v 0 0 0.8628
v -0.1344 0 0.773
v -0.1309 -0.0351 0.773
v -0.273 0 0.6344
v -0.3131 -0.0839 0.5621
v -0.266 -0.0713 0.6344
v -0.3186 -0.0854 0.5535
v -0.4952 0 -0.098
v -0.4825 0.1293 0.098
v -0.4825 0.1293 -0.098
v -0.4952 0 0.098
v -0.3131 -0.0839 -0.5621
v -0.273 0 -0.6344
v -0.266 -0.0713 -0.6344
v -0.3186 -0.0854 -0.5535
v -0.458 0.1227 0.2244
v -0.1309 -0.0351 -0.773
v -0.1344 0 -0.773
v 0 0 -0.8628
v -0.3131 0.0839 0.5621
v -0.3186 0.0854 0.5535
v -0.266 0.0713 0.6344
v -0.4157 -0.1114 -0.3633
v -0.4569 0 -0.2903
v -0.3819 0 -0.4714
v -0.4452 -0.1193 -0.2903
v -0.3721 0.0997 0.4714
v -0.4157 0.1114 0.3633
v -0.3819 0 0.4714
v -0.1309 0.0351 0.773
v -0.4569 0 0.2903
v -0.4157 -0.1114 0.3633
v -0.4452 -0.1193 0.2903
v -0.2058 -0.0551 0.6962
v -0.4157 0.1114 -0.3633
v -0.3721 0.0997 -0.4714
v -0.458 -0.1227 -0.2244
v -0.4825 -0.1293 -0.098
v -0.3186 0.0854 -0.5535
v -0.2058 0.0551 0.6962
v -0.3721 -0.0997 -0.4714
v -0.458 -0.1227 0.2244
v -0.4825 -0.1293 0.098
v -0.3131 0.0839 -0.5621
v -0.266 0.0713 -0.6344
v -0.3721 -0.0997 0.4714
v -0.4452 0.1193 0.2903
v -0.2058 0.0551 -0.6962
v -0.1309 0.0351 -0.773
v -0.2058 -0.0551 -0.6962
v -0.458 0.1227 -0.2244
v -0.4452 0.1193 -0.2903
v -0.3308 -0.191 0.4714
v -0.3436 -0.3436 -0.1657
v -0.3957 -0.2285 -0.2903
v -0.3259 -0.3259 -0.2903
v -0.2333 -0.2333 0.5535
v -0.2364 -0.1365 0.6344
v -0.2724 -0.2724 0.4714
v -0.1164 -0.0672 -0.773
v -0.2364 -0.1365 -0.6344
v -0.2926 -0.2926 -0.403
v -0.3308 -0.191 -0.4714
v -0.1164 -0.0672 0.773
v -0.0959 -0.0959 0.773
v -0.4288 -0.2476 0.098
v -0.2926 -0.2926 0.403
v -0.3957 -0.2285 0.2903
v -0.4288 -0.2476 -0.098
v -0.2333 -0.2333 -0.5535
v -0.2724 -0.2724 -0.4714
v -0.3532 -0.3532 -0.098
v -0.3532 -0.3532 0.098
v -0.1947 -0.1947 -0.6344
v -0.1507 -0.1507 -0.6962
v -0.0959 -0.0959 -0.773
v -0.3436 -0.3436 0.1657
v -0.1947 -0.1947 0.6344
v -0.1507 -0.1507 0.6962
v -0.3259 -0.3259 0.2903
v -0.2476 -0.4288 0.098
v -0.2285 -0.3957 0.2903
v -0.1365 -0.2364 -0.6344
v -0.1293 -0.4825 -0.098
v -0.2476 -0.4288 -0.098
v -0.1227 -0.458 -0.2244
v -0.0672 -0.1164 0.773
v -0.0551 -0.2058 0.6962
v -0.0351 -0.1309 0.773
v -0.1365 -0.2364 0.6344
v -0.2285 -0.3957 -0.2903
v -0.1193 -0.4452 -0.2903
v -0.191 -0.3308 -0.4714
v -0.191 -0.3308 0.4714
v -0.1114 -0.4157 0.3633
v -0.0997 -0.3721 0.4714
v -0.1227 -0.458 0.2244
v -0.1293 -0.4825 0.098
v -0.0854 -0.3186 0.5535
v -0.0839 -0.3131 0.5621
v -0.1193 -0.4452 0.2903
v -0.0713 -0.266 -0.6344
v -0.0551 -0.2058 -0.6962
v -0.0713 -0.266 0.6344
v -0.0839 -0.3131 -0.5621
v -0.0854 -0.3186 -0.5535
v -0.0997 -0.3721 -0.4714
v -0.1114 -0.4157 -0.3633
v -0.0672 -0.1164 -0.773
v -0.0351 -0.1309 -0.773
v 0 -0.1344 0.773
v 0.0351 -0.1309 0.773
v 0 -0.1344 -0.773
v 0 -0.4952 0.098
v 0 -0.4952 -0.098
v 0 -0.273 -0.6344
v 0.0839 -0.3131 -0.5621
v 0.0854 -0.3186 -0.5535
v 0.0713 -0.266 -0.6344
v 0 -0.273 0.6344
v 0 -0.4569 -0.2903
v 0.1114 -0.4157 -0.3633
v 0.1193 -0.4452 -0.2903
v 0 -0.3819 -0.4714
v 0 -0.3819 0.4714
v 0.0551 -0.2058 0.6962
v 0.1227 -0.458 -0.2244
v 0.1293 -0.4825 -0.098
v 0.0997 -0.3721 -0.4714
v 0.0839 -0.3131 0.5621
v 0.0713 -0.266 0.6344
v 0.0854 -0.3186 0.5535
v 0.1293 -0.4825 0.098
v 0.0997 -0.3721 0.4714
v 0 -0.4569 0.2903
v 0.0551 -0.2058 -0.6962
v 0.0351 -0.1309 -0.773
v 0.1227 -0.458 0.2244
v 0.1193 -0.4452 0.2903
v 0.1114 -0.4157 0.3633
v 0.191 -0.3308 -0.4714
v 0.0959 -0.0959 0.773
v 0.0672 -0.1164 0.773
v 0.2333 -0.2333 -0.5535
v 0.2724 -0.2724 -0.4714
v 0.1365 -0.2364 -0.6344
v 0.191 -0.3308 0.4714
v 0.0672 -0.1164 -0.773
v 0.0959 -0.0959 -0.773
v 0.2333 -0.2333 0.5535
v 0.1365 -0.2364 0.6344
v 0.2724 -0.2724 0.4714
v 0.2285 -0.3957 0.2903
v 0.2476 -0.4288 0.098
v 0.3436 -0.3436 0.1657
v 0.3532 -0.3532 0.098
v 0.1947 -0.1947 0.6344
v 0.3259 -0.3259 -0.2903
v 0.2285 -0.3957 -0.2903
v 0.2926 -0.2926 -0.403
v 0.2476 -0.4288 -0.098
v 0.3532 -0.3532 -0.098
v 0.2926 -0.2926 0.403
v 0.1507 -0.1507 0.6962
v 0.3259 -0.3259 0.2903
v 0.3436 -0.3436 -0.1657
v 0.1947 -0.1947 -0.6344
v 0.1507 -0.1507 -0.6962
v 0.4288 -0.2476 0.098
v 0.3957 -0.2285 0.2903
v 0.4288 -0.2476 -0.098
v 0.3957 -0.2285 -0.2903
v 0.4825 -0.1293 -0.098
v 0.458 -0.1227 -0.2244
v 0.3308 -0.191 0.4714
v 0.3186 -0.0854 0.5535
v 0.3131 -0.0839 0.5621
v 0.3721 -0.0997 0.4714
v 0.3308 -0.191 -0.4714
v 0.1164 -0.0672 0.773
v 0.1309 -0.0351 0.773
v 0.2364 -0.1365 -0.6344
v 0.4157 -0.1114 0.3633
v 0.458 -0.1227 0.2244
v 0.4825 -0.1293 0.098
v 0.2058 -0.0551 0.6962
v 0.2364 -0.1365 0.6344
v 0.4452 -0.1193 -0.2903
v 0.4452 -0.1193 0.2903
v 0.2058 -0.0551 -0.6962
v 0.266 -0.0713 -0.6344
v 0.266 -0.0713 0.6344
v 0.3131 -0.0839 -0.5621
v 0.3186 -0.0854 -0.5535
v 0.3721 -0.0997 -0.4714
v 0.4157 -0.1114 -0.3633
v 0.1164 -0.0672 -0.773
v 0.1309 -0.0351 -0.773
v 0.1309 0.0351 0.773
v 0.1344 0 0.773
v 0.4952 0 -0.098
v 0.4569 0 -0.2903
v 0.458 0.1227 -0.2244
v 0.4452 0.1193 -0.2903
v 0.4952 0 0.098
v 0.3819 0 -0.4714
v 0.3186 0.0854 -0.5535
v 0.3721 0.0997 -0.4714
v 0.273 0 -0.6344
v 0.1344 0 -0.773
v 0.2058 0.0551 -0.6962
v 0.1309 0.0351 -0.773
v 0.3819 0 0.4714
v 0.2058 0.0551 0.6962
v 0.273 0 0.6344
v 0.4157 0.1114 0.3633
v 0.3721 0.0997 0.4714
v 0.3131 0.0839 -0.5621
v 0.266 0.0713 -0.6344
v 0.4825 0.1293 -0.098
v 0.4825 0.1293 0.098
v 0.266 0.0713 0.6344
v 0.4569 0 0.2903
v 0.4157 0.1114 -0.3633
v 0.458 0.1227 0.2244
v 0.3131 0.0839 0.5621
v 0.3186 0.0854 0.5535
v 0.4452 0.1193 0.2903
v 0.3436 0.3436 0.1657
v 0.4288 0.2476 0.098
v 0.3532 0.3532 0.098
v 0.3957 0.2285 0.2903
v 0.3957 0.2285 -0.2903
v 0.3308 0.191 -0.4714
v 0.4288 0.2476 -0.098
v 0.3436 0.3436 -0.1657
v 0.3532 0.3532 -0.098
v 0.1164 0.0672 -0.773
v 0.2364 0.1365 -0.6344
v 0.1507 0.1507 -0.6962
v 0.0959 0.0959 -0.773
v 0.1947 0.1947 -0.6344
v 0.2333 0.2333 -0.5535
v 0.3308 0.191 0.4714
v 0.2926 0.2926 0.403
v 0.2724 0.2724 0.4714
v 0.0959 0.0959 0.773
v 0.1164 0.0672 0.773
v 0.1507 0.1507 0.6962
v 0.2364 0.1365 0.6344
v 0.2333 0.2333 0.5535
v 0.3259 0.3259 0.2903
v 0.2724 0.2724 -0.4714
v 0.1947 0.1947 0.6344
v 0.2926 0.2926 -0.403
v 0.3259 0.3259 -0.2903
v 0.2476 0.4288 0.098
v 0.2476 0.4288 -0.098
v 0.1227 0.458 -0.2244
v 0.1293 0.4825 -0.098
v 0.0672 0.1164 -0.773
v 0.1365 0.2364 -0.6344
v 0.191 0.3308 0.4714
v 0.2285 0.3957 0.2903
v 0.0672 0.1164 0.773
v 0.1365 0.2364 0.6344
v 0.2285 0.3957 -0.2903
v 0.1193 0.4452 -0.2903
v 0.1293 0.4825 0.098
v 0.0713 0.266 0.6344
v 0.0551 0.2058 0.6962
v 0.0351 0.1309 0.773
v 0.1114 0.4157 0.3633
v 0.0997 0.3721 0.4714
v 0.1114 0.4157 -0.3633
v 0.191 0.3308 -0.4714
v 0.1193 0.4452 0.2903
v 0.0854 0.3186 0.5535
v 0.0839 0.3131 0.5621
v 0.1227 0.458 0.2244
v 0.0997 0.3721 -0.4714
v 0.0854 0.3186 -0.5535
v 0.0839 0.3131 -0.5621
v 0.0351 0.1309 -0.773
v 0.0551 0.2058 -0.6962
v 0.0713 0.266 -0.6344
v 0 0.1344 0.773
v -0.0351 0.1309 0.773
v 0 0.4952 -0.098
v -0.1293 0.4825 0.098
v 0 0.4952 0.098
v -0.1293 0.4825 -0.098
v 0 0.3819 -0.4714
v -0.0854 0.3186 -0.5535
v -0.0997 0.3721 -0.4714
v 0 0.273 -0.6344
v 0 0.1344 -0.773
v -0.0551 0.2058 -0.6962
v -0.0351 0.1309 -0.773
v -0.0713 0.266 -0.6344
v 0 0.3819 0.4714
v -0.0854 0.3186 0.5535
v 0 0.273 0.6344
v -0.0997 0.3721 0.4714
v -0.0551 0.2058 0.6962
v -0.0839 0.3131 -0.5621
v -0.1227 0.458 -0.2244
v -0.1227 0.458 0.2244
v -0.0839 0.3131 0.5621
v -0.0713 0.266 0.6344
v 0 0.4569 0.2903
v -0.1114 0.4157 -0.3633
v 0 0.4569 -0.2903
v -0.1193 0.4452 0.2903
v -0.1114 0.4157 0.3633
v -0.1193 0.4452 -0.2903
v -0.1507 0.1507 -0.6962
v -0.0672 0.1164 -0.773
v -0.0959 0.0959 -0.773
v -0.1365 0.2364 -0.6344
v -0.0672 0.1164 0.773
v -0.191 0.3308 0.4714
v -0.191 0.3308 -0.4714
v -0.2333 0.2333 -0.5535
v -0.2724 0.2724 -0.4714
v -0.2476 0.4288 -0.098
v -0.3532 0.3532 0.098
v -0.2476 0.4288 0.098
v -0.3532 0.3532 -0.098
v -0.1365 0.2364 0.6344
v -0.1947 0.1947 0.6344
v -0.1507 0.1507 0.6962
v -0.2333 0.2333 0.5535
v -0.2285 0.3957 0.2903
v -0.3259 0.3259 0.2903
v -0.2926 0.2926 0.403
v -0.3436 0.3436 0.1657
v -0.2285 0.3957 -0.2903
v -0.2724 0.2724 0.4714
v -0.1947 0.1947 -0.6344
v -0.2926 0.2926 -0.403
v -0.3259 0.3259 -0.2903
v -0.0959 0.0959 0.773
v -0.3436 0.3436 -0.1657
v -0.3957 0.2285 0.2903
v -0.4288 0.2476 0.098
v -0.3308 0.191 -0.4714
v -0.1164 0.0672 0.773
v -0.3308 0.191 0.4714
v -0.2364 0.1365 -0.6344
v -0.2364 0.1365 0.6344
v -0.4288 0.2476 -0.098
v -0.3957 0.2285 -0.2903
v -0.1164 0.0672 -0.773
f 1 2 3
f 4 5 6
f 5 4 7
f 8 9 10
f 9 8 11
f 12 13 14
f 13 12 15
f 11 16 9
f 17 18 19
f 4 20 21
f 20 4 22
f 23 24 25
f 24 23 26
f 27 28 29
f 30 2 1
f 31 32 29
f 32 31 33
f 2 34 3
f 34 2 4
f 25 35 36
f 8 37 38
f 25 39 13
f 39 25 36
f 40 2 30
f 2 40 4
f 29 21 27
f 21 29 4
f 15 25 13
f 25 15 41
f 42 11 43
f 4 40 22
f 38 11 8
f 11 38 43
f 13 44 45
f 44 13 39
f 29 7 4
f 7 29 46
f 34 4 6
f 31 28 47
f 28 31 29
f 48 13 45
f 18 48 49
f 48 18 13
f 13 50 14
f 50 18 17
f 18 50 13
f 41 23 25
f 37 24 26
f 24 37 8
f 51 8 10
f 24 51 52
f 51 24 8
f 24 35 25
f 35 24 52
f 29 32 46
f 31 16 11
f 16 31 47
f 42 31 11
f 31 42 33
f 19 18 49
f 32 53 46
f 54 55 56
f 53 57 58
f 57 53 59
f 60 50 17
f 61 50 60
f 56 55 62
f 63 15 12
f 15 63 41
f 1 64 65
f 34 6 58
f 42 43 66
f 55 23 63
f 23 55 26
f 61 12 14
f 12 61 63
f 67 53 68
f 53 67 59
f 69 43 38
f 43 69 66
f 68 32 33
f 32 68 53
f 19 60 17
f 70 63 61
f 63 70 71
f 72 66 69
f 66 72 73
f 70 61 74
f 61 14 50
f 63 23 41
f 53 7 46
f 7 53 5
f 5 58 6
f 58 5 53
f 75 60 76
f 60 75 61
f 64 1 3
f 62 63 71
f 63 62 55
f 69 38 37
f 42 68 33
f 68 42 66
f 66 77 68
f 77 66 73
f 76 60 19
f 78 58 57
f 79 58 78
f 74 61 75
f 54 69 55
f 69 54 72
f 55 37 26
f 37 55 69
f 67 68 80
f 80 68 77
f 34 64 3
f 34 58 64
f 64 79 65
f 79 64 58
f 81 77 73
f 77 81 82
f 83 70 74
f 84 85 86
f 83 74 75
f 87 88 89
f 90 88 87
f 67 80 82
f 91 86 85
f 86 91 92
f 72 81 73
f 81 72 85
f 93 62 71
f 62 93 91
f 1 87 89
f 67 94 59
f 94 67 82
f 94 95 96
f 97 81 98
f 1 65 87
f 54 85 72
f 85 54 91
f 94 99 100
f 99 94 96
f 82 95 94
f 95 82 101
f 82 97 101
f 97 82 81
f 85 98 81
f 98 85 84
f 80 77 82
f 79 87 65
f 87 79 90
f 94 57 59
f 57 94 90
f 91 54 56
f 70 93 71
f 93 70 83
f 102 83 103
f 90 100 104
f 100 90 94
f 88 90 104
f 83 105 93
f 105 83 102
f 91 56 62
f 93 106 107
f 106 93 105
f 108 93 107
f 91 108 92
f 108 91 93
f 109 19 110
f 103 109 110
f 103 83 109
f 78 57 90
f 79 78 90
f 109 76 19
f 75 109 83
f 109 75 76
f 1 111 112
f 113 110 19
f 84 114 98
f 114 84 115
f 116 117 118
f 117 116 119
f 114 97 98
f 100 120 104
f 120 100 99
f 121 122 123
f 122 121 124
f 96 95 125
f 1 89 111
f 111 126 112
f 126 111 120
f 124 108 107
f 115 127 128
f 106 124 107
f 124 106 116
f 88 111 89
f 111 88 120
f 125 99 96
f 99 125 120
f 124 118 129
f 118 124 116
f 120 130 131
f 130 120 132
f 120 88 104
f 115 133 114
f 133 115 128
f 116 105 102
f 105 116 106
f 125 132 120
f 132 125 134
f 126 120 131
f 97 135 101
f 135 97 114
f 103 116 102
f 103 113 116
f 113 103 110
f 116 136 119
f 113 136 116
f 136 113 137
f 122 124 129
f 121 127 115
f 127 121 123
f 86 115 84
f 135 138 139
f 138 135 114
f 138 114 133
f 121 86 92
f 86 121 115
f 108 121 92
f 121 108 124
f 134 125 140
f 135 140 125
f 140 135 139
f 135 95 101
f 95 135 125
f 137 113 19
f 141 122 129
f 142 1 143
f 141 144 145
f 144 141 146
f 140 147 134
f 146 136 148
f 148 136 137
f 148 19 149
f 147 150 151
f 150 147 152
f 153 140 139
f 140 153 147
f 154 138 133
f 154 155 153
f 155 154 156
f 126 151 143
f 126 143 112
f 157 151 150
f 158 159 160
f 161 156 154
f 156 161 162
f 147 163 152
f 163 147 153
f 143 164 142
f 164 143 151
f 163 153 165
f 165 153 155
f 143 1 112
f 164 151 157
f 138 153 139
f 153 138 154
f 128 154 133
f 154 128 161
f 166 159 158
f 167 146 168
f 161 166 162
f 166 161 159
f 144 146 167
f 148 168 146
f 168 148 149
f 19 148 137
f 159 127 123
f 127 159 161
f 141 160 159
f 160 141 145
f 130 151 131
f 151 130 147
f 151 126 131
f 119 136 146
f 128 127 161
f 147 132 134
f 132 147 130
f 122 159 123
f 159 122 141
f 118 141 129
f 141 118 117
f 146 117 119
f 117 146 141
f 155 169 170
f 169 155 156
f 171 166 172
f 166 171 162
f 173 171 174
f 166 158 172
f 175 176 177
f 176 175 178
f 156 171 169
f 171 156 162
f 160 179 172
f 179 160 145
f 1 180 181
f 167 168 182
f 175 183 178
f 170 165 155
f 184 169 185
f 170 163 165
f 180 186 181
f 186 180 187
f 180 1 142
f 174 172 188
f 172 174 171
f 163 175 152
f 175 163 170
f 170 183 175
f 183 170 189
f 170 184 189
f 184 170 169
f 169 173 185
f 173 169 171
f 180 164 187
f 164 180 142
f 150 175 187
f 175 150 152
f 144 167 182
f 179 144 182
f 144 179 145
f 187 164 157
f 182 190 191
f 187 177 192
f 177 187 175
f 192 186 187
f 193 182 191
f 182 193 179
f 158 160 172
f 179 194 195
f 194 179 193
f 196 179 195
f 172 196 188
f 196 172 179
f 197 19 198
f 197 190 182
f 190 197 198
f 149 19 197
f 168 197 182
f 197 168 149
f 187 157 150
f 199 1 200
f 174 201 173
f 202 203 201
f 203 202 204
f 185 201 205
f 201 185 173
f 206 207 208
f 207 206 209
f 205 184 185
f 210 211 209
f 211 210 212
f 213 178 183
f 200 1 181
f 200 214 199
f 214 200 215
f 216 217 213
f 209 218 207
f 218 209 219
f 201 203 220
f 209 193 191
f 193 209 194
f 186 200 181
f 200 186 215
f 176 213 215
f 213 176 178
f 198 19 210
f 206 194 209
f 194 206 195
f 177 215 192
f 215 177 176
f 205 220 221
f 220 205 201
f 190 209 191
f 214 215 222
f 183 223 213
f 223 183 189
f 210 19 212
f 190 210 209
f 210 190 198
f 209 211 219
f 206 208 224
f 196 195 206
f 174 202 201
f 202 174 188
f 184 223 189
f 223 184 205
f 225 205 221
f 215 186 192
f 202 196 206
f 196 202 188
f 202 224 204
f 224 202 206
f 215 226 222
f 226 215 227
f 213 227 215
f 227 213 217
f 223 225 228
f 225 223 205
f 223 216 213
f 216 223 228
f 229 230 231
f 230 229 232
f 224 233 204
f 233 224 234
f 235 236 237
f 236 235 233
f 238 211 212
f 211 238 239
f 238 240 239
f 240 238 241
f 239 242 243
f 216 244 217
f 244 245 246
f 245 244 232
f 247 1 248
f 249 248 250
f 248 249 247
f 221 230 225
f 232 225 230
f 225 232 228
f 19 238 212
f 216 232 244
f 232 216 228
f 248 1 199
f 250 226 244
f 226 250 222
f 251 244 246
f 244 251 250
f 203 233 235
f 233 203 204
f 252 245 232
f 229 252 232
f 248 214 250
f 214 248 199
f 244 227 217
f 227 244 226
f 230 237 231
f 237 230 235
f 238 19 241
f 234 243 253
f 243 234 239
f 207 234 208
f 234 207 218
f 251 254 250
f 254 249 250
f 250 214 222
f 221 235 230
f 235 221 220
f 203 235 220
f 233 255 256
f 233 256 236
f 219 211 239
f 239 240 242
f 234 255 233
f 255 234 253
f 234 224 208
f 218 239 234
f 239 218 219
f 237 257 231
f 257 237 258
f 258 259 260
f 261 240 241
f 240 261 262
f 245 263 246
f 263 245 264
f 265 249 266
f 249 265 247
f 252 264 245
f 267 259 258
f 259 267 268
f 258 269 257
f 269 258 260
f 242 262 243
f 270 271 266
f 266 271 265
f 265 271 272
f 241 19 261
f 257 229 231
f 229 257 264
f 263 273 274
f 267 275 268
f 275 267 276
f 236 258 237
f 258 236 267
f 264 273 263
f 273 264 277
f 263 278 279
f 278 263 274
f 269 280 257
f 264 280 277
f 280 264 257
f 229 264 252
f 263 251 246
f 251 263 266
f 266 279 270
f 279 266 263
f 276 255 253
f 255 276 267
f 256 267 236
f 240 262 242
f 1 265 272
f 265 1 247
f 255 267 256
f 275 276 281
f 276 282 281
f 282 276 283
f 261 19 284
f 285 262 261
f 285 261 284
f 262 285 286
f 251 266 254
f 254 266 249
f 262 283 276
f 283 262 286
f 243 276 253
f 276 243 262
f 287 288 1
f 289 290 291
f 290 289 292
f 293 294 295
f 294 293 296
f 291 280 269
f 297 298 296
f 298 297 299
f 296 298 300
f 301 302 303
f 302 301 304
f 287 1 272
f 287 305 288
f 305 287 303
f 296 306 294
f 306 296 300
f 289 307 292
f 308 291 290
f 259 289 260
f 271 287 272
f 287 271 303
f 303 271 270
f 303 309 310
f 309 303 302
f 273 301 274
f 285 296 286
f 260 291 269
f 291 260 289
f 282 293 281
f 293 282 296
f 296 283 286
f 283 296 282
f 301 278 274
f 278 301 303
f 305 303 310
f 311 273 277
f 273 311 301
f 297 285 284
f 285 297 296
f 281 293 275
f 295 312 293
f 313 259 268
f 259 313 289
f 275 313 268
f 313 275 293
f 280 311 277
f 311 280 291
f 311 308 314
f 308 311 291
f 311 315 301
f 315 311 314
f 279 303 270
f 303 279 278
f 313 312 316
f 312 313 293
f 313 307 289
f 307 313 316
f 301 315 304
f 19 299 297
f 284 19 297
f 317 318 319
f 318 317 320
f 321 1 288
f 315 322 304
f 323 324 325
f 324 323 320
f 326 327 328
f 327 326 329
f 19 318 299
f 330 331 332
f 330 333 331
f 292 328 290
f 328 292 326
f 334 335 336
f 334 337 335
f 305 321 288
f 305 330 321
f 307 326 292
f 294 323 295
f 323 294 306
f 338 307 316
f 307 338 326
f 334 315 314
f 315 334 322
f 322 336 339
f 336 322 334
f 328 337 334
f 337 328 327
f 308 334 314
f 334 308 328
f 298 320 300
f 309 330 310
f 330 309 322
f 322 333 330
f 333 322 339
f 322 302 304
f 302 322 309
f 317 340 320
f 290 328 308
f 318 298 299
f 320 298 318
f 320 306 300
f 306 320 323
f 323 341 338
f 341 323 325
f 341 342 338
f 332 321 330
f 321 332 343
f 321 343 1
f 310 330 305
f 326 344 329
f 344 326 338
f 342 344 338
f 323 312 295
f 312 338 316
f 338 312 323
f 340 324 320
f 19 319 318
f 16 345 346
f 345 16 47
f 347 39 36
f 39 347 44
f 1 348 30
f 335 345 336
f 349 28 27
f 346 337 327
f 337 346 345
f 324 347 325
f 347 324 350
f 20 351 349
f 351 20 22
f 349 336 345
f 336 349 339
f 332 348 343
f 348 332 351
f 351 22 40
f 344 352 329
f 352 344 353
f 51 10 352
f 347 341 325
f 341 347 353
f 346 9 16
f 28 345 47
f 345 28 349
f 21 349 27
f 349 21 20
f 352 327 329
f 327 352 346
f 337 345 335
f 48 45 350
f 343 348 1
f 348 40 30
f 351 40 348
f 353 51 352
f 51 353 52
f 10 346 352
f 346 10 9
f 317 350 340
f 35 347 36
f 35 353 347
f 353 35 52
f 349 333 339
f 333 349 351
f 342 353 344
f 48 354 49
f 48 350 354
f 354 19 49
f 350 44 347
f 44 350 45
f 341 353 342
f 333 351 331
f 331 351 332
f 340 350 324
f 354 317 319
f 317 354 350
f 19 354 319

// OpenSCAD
//------------------------------------------------------------------------------------------
// THIS CODE WAS GENERATED WITH GRAPHSCAD
//------------------------------------------------------------------------------------------
// Graphscad is a graphical nodal editor to create .SCAD files
//
// More info : http://graphscad.free.fr
//
// Scad Files created with Graphscad can be edited by graphscad
// Scad Files created with Graphscad can be read by Openscad
//
//------------------------------------------------------------------------------------------
module intersectionfor()
{
 function node_sphere_matrix(i=0,j=0,k=0,l=0,m=0,n=0) = translate([0.5,0,0]);
 module node_sphere(i=0,j=0,k=0,l=0,m=0,n=0)
 {
  translate([0.5,0,0]) sphere(r=1.0,$fn=32);
 }
 function node_rotate_matrix(i=0,j=0,k=0,l=0,m=0,n=0) = rotate([0,0,i])*node_sphere_matrix(i=i,j=j,k=k,l=l,m=m,n=n);
 module node_rotate(i=0,j=0,k=0,l=0,m=0,n=0)
 {
  rotate([0,0,i])node_sphere(i,j,k,l,m,n);
 }
 function node_intersectionfor_matrix(i=0,j=0,k=0,l=0,m=0,n=0) = node_rotate_matrix(i=i,j=j,k=k,l=l,m=m,n=n);
 module node_intersectionfor(i=0,j=0,k=0,l=0,m=0,n=0)
 {
  intersection_for(i=[0:30:360])
  {
   node_rotate(i,j,k,l,m,n);
  }
 }
 node_intersectionfor();
 /*--------------------------------------------------------------------------------------------------------
  Graphscad Utils functions
  This code is Used By Graphscad Nodal Editor to generate SCAD files
 --------------------------------------------------------------------------------------------------------*/
 function det4x4(a) =
 a[0][0]*a[1][1]*a[2][2]*a[3][3] + a[0][0]*a[1][2]*a[2][3]*a[3][1] + a[0][0]*a[1][3]*a[2][1]*a[3][2]
 + a[0][1]*a[1][0]*a[2][3]*a[3][2] + a[0][1]*a[1][2]*a[2][0]*a[3][3] + a[0][1]*a[1][3]*a[2][2]*a[3][0]
 + a[0][2]*a[1][0]*a[2][1]*a[3][3] + a[0][2]*a[1][1]*a[2][3]*a[3][0] + a[0][2]*a[1][3]*a[2][0]*a[3][1]
 + a[0][3]*a[1][0]*a[2][2]*a[3][1] + a[0][3]*a[1][1]*a[2][0]*a[3][2] + a[0][3]*a[1][2]*a[2][1]*a[3][0]
 - a[0][0]*a[1][1]*a[2][3]*a[3][2] - a[0][0]*a[1][2]*a[2][1]*a[3][3] - a[0][0]*a[1][3]*a[2][2]*a[3][1]
 - a[0][1]*a[1][0]*a[2][2]*a[3][3] - a[0][1]*a[1][2]*a[2][3]*a[3][0] - a[0][1]*a[1][3]*a[2][0]*a[3][2]
 - a[0][2]*a[1][0]*a[2][3]*a[3][1] - a[0][2]*a[1][1]*a[2][0]*a[3][3] - a[0][2]*a[1][3]*a[2][1]*a[3][0]
 - a[0][3]*a[1][0]*a[2][1]*a[3][2] - a[0][3]*a[1][1]*a[2][2]*a[3][0] - a[0][3]*a[1][2]*a[2][0]*a[3][1];
 function invb00(a) = a[1][1]*a[2][2]*a[3][3] + a[1][2]*a[2][3]*a[3][1] + a[1][3]*a[2][1]*a[3][2] - a[1][1]*a[2][3]*a[3][2] - a[1][2]*a[2][1]*a[3][3] - a[1][3]*a[2][2]*a[3][1];
 function invb01(a) = a[0][1]*a[2][3]*a[3][2] + a[0][2]*a[2][1]*a[3][3] + a[0][3]*a[2][2]*a[3][1] - a[0][1]*a[2][2]*a[3][3] - a[0][2]*a[2][3]*a[3][1] - a[0][3]*a[2][1]*a[3][2];
 function invb02(a) = a[0][1]*a[1][2]*a[3][3] + a[0][2]*a[1][3]*a[3][1] + a[0][3]*a[1][1]*a[3][2] - a[0][1]*a[1][3]*a[3][2] - a[0][2]*a[1][1]*a[3][3] - a[0][3]*a[1][2]*a[3][1];
 function invb03(a) = a[0][1]*a[1][3]*a[2][2] + a[0][2]*a[1][1]*a[2][3] + a[0][3]*a[1][2]*a[2][1] - a[0][1]*a[1][2]*a[2][3] - a[0][2]*a[1][3]*a[2][1] - a[0][3]*a[1][1]*a[2][2];
 function invb10(a) = a[1][0]*a[2][3]*a[3][2] + a[1][2]*a[2][0]*a[3][3] + a[1][3]*a[2][2]*a[3][0] - a[1][0]*a[2][2]*a[3][3] - a[1][2]*a[2][3]*a[3][0] - a[1][3]*a[2][0]*a[3][2];
 function invb11(a) = a[0][0]*a[2][2]*a[3][3] + a[0][2]*a[2][3]*a[3][0] + a[0][3]*a[2][0]*a[3][2] - a[0][0]*a[2][3]*a[3][2] - a[0][2]*a[2][0]*a[3][3] - a[0][3]*a[2][2]*a[3][0];
 function invb12(a) = a[0][0]*a[1][3]*a[3][2] + a[0][2]*a[1][0]*a[3][3] + a[0][3]*a[1][2]*a[3][0] - a[0][0]*a[1][2]*a[3][3] - a[0][2]*a[1][3]*a[3][0] - a[0][3]*a[1][0]*a[3][2];
 function invb13(a) = a[0][0]*a[1][2]*a[2][3] + a[0][2]*a[1][3]*a[2][0] + a[0][3]*a[1][0]*a[2][2] - a[0][0]*a[1][3]*a[2][2] - a[0][2]*a[1][0]*a[2][3] - a[0][3]*a[1][2]*a[2][0];
 function invb20(a) = a[1][0]*a[2][1]*a[3][3] + a[1][1]*a[2][3]*a[3][0] + a[1][3]*a[2][0]*a[3][1] - a[1][0]*a[2][3]*a[3][1] - a[1][1]*a[2][0]*a[3][3] - a[1][3]*a[2][1]*a[3][0];
 function invb21(a) = a[0][0]*a[2][3]*a[3][1] + a[0][1]*a[2][0]*a[3][3] + a[0][3]*a[2][1]*a[3][0] - a[0][0]*a[2][1]*a[3][3] - a[0][1]*a[2][3]*a[3][0] - a[0][3]*a[2][0]*a[3][1];
 function invb22(a) = a[0][0]*a[1][1]*a[3][3] + a[0][1]*a[1][3]*a[3][0] + a[0][3]*a[1][0]*a[3][1] - a[0][0]*a[1][3]*a[3][1] - a[0][1]*a[1][0]*a[3][3] - a[0][3]*a[1][1]*a[3][0];
 function invb23(a) = a[0][0]*a[1][3]*a[2][1] + a[0][1]*a[1][0]*a[2][3] + a[0][3]*a[1][1]*a[2][0] - a[0][0]*a[1][1]*a[2][3] - a[0][1]*a[1][3]*a[2][0] - a[0][3]*a[1][0]*a[2][1];
 function invb30(a) = a[1][0]*a[2][2]*a[3][1] + a[1][1]*a[2][0]*a[3][2] + a[1][2]*a[2][1]*a[3][0] - a[1][0]*a[2][1]*a[3][2] - a[1][1]*a[2][2]*a[3][0] - a[1][2]*a[2][0]*a[3][1];
 function invb31(a) = a[0][0]*a[2][1]*a[3][2] + a[0][1]*a[2][2]*a[3][0] + a[0][2]*a[2][0]*a[3][1] - a[0][0]*a[2][2]*a[3][1] - a[0][1]*a[2][0]*a[3][2] - a[0][2]*a[2][1]*a[3][0];
 function invb32(a) = a[0][0]*a[1][2]*a[3][1] + a[0][1]*a[1][0]*a[3][2] + a[0][2]*a[1][1]*a[3][0] - a[0][0]*a[1][1]*a[3][2] - a[0][1]*a[1][2]*a[3][0] - a[0][2]*a[1][0]*a[3][1];
 function invb33(a) = a[0][0]*a[1][1]*a[2][2] + a[0][1]*a[1][2]*a[2][0] + a[0][2]*a[1][0]*a[2][1] - a[0][0]*a[1][2]*a[2][1] - a[0][1]*a[1][0]*a[2][2] - a[0][2]*a[1][1]*a[2][0];
 function inv4x4(a)= (1/det4x4(a))*[
 [invb00(a),invb01(a),invb02(a),invb03(a)],
 [invb10(a),invb11(a),invb12(a),invb13(a)],
 [invb20(a),invb21(a),invb22(a),invb23(a)],
 [invb30(a),invb31(a),invb32(a),invb33(a)]];
 function onlytranslate(a)=  [
                        [1,0,0,a[0][3]],
                        [0,1,0,a[1][3]],
                        [0,0,1,a[2][3]],
                        [0,0,0,1]];
 function negonlytranslate(a)=[
                        [1,0,0,-a[0][3]],
                        [0,1,0,-a[1][3]],
                        [0,0,1,-a[2][3]],
                        [0,0,0,1]];
 function lookatvec(t,parentmat) = [t[0]-parentmat[0][3],
                                 t[1]-parentmat[1][3],
                                 t[2]-parentmat[2][3]];
 /*
              rx = '0'
              ry = 'acos('+tz+'/norm(['+tx+','+ty+','+tz+']))'
              rz = 'atan2('+ty+','+tx+')'
 */
 function lookatrot(t,parentmat) = [0,
                                 acos((t[2]-parentmat[2][3])/norm(lookatvec(t,parentmat))),
                                 atan2(t[1]-parentmat[1][3],t[0]-parentmat[0][3])];
 function gettranslation(m) = [m[0][3],m[1][3],m[2][3]];
 function vectormulmatrix(v,m) = m*v;
 function vectorlength(v) = norm(v);
 function vectorx(v) = v[0];
 function vectory(v) = v[1];
 function vectorz(v) = v[2];
 function vectoradd(a,b) = (a+b);
 function vectorsub(a,b) = (a-b);
 function vectormul(a,b) = (a*b);
 function vectordiv(a,b) = (a*(1/b));
 function scale(v)=[[v[0],0,0,0],
                    [0,v[1],0,0],
                    [0,0,v[2],0],
                    [0,0,0,1]];
 function rotatex(a)=[[1,0,0,0],
                      [0,cos(a),-sin(a),0],
                      [0,sin(a),cos(a),0],
                      [0,0,0,1]];
 function rotatey(a)=[[cos(a),0,sin(a),0],
                      [0,1,0,0],
                      [-sin(a),0,cos(a),0],
                      [0,0,0,1]];
 function rotatez(a)=[[cos(a),-sin(a),0,0],
                      [sin(a),cos(a),0,0],
                      [0,0,1,0],
                      [0,0,0,1]];
 function rotatea(c,s,l,m,n)=[[l*l*(1-c)+c,m*l*(1-c)-n*s,n*l*(1-c)+m*s,0],
                              [l*m*(1-c)+n*s,m*m*(1-c)+c,n*m*(1-c)-l*s,0],
                              [l*n*(1-c)-m*s,m*n*(1-c)+l*s,n*n*(1-c)+c,0],
                              [0,0,0,1]];
 function rotateanv(a,nv)=rotatea(cos(a),sin(a),nv[0],nv[1],nv[2]);
 function rotate(a,v, normV=true)=(v==undef)?rotatez(a[2])*rotatey(a[1])*rotatex(a[0]):
                      normV ? rotateanv(a,v/sqrt(v*v)) : rotateanv(a,v);
 function translate(v)=[[1,0,0,v[0]],
                        [0,1,0,v[1]],
                        [0,0,1,v[2]],
                        [0,0,0,1]];
 function mirrorabc(a,b,c)=[[1-2*a*a,-2*a*b,-2*a*c,0],
                            [-2*a*b,1-2*b*b,-2*b*c,0],
                            [-2*a*c,-2*b*c,1-2*c*c,0],
                            [0,0,0,1]];
 function mirrornv(nv)=mirrorabc(nv[0],nv[1],nv[2]);
 function mirror(v)=mirrornv(v/sqrt(v*v));
}
intersectionfor();


/*BEGINGRAPHSCAD{
    "nodes": [
        {
            "name": "node_sphere",
            "inputplugs": [
                {
                    "type": "str",
                    "name": "radius",
                    "value": "1.0"
                },
                {
                    "type": "str",
                    "name": "tx",
                    "value": "0.5"
                },
                {
                    "type": "str",
                    "name": "ty",
                    "value": "0"
                },
                {
                    "type": "str",
                    "name": "tz",
                    "value": "0"
                },
                {
                    "type": "str",
                    "name": "$fn",
                    "value": "32"
                }
            ],
            "typename": "Node_sphere",
            "version": 1,
            "y": -58.41349154704949,
            "x": -979.2036261563001
        },
        {
            "name": "node_rotate",
            "inputplugs": [
                {
                    "connection": "node_sphere.object",
                    "type": "object",
                    "name": "object",
                    "value": ""
                },
                {
                    "type": "str",
                    "name": "rx",
                    "value": "0"
                },
                {
                    "type": "str",
                    "name": "ry",
                    "value": "0"
                },
                {
                    "type": "str",
                    "name": "rz",
                    "value": "i"
                },
                {
                    "type": "str",
                    "name": "space",
                    "value": "world",
                    "combo": [
                        "world",
                        "object",
                        "local"
                    ]
                }
            ],
            "typename": "Node_rotate",
            "version": 1,
            "y": -59.41634449760761,
            "x": -577.407785645933
        },
        {
            "name": "node_intersectionfor",
            "inputplugs": [
                {
                    "connection": "node_rotate.object",
                    "type": "object",
                    "name": "object",
                    "value": ""
                },
                {
                    "type": "str",
                    "name": "variablename",
                    "value": "i",
                    "combo": [
                        "i",
                        "j",
                        "k",
                        "l",
                        "m",
                        "n"
                    ]
                },
                {
                    "type": "str",
                    "name": "start",
                    "value": "0"
                },
                {
                    "type": "str",
                    "name": "end",
                    "value": "360"
                },
                {
                    "type": "str",
                    "name": "step",
                    "value": "30"
                }
            ],
            "typename": "Node_intersectionfor",
            "version": 1,
            "y": -104.18240255183413,
            "x": -176.36004593301448
        }
    ],
    "version": 2
}ENDGRAPHSCAD*/
